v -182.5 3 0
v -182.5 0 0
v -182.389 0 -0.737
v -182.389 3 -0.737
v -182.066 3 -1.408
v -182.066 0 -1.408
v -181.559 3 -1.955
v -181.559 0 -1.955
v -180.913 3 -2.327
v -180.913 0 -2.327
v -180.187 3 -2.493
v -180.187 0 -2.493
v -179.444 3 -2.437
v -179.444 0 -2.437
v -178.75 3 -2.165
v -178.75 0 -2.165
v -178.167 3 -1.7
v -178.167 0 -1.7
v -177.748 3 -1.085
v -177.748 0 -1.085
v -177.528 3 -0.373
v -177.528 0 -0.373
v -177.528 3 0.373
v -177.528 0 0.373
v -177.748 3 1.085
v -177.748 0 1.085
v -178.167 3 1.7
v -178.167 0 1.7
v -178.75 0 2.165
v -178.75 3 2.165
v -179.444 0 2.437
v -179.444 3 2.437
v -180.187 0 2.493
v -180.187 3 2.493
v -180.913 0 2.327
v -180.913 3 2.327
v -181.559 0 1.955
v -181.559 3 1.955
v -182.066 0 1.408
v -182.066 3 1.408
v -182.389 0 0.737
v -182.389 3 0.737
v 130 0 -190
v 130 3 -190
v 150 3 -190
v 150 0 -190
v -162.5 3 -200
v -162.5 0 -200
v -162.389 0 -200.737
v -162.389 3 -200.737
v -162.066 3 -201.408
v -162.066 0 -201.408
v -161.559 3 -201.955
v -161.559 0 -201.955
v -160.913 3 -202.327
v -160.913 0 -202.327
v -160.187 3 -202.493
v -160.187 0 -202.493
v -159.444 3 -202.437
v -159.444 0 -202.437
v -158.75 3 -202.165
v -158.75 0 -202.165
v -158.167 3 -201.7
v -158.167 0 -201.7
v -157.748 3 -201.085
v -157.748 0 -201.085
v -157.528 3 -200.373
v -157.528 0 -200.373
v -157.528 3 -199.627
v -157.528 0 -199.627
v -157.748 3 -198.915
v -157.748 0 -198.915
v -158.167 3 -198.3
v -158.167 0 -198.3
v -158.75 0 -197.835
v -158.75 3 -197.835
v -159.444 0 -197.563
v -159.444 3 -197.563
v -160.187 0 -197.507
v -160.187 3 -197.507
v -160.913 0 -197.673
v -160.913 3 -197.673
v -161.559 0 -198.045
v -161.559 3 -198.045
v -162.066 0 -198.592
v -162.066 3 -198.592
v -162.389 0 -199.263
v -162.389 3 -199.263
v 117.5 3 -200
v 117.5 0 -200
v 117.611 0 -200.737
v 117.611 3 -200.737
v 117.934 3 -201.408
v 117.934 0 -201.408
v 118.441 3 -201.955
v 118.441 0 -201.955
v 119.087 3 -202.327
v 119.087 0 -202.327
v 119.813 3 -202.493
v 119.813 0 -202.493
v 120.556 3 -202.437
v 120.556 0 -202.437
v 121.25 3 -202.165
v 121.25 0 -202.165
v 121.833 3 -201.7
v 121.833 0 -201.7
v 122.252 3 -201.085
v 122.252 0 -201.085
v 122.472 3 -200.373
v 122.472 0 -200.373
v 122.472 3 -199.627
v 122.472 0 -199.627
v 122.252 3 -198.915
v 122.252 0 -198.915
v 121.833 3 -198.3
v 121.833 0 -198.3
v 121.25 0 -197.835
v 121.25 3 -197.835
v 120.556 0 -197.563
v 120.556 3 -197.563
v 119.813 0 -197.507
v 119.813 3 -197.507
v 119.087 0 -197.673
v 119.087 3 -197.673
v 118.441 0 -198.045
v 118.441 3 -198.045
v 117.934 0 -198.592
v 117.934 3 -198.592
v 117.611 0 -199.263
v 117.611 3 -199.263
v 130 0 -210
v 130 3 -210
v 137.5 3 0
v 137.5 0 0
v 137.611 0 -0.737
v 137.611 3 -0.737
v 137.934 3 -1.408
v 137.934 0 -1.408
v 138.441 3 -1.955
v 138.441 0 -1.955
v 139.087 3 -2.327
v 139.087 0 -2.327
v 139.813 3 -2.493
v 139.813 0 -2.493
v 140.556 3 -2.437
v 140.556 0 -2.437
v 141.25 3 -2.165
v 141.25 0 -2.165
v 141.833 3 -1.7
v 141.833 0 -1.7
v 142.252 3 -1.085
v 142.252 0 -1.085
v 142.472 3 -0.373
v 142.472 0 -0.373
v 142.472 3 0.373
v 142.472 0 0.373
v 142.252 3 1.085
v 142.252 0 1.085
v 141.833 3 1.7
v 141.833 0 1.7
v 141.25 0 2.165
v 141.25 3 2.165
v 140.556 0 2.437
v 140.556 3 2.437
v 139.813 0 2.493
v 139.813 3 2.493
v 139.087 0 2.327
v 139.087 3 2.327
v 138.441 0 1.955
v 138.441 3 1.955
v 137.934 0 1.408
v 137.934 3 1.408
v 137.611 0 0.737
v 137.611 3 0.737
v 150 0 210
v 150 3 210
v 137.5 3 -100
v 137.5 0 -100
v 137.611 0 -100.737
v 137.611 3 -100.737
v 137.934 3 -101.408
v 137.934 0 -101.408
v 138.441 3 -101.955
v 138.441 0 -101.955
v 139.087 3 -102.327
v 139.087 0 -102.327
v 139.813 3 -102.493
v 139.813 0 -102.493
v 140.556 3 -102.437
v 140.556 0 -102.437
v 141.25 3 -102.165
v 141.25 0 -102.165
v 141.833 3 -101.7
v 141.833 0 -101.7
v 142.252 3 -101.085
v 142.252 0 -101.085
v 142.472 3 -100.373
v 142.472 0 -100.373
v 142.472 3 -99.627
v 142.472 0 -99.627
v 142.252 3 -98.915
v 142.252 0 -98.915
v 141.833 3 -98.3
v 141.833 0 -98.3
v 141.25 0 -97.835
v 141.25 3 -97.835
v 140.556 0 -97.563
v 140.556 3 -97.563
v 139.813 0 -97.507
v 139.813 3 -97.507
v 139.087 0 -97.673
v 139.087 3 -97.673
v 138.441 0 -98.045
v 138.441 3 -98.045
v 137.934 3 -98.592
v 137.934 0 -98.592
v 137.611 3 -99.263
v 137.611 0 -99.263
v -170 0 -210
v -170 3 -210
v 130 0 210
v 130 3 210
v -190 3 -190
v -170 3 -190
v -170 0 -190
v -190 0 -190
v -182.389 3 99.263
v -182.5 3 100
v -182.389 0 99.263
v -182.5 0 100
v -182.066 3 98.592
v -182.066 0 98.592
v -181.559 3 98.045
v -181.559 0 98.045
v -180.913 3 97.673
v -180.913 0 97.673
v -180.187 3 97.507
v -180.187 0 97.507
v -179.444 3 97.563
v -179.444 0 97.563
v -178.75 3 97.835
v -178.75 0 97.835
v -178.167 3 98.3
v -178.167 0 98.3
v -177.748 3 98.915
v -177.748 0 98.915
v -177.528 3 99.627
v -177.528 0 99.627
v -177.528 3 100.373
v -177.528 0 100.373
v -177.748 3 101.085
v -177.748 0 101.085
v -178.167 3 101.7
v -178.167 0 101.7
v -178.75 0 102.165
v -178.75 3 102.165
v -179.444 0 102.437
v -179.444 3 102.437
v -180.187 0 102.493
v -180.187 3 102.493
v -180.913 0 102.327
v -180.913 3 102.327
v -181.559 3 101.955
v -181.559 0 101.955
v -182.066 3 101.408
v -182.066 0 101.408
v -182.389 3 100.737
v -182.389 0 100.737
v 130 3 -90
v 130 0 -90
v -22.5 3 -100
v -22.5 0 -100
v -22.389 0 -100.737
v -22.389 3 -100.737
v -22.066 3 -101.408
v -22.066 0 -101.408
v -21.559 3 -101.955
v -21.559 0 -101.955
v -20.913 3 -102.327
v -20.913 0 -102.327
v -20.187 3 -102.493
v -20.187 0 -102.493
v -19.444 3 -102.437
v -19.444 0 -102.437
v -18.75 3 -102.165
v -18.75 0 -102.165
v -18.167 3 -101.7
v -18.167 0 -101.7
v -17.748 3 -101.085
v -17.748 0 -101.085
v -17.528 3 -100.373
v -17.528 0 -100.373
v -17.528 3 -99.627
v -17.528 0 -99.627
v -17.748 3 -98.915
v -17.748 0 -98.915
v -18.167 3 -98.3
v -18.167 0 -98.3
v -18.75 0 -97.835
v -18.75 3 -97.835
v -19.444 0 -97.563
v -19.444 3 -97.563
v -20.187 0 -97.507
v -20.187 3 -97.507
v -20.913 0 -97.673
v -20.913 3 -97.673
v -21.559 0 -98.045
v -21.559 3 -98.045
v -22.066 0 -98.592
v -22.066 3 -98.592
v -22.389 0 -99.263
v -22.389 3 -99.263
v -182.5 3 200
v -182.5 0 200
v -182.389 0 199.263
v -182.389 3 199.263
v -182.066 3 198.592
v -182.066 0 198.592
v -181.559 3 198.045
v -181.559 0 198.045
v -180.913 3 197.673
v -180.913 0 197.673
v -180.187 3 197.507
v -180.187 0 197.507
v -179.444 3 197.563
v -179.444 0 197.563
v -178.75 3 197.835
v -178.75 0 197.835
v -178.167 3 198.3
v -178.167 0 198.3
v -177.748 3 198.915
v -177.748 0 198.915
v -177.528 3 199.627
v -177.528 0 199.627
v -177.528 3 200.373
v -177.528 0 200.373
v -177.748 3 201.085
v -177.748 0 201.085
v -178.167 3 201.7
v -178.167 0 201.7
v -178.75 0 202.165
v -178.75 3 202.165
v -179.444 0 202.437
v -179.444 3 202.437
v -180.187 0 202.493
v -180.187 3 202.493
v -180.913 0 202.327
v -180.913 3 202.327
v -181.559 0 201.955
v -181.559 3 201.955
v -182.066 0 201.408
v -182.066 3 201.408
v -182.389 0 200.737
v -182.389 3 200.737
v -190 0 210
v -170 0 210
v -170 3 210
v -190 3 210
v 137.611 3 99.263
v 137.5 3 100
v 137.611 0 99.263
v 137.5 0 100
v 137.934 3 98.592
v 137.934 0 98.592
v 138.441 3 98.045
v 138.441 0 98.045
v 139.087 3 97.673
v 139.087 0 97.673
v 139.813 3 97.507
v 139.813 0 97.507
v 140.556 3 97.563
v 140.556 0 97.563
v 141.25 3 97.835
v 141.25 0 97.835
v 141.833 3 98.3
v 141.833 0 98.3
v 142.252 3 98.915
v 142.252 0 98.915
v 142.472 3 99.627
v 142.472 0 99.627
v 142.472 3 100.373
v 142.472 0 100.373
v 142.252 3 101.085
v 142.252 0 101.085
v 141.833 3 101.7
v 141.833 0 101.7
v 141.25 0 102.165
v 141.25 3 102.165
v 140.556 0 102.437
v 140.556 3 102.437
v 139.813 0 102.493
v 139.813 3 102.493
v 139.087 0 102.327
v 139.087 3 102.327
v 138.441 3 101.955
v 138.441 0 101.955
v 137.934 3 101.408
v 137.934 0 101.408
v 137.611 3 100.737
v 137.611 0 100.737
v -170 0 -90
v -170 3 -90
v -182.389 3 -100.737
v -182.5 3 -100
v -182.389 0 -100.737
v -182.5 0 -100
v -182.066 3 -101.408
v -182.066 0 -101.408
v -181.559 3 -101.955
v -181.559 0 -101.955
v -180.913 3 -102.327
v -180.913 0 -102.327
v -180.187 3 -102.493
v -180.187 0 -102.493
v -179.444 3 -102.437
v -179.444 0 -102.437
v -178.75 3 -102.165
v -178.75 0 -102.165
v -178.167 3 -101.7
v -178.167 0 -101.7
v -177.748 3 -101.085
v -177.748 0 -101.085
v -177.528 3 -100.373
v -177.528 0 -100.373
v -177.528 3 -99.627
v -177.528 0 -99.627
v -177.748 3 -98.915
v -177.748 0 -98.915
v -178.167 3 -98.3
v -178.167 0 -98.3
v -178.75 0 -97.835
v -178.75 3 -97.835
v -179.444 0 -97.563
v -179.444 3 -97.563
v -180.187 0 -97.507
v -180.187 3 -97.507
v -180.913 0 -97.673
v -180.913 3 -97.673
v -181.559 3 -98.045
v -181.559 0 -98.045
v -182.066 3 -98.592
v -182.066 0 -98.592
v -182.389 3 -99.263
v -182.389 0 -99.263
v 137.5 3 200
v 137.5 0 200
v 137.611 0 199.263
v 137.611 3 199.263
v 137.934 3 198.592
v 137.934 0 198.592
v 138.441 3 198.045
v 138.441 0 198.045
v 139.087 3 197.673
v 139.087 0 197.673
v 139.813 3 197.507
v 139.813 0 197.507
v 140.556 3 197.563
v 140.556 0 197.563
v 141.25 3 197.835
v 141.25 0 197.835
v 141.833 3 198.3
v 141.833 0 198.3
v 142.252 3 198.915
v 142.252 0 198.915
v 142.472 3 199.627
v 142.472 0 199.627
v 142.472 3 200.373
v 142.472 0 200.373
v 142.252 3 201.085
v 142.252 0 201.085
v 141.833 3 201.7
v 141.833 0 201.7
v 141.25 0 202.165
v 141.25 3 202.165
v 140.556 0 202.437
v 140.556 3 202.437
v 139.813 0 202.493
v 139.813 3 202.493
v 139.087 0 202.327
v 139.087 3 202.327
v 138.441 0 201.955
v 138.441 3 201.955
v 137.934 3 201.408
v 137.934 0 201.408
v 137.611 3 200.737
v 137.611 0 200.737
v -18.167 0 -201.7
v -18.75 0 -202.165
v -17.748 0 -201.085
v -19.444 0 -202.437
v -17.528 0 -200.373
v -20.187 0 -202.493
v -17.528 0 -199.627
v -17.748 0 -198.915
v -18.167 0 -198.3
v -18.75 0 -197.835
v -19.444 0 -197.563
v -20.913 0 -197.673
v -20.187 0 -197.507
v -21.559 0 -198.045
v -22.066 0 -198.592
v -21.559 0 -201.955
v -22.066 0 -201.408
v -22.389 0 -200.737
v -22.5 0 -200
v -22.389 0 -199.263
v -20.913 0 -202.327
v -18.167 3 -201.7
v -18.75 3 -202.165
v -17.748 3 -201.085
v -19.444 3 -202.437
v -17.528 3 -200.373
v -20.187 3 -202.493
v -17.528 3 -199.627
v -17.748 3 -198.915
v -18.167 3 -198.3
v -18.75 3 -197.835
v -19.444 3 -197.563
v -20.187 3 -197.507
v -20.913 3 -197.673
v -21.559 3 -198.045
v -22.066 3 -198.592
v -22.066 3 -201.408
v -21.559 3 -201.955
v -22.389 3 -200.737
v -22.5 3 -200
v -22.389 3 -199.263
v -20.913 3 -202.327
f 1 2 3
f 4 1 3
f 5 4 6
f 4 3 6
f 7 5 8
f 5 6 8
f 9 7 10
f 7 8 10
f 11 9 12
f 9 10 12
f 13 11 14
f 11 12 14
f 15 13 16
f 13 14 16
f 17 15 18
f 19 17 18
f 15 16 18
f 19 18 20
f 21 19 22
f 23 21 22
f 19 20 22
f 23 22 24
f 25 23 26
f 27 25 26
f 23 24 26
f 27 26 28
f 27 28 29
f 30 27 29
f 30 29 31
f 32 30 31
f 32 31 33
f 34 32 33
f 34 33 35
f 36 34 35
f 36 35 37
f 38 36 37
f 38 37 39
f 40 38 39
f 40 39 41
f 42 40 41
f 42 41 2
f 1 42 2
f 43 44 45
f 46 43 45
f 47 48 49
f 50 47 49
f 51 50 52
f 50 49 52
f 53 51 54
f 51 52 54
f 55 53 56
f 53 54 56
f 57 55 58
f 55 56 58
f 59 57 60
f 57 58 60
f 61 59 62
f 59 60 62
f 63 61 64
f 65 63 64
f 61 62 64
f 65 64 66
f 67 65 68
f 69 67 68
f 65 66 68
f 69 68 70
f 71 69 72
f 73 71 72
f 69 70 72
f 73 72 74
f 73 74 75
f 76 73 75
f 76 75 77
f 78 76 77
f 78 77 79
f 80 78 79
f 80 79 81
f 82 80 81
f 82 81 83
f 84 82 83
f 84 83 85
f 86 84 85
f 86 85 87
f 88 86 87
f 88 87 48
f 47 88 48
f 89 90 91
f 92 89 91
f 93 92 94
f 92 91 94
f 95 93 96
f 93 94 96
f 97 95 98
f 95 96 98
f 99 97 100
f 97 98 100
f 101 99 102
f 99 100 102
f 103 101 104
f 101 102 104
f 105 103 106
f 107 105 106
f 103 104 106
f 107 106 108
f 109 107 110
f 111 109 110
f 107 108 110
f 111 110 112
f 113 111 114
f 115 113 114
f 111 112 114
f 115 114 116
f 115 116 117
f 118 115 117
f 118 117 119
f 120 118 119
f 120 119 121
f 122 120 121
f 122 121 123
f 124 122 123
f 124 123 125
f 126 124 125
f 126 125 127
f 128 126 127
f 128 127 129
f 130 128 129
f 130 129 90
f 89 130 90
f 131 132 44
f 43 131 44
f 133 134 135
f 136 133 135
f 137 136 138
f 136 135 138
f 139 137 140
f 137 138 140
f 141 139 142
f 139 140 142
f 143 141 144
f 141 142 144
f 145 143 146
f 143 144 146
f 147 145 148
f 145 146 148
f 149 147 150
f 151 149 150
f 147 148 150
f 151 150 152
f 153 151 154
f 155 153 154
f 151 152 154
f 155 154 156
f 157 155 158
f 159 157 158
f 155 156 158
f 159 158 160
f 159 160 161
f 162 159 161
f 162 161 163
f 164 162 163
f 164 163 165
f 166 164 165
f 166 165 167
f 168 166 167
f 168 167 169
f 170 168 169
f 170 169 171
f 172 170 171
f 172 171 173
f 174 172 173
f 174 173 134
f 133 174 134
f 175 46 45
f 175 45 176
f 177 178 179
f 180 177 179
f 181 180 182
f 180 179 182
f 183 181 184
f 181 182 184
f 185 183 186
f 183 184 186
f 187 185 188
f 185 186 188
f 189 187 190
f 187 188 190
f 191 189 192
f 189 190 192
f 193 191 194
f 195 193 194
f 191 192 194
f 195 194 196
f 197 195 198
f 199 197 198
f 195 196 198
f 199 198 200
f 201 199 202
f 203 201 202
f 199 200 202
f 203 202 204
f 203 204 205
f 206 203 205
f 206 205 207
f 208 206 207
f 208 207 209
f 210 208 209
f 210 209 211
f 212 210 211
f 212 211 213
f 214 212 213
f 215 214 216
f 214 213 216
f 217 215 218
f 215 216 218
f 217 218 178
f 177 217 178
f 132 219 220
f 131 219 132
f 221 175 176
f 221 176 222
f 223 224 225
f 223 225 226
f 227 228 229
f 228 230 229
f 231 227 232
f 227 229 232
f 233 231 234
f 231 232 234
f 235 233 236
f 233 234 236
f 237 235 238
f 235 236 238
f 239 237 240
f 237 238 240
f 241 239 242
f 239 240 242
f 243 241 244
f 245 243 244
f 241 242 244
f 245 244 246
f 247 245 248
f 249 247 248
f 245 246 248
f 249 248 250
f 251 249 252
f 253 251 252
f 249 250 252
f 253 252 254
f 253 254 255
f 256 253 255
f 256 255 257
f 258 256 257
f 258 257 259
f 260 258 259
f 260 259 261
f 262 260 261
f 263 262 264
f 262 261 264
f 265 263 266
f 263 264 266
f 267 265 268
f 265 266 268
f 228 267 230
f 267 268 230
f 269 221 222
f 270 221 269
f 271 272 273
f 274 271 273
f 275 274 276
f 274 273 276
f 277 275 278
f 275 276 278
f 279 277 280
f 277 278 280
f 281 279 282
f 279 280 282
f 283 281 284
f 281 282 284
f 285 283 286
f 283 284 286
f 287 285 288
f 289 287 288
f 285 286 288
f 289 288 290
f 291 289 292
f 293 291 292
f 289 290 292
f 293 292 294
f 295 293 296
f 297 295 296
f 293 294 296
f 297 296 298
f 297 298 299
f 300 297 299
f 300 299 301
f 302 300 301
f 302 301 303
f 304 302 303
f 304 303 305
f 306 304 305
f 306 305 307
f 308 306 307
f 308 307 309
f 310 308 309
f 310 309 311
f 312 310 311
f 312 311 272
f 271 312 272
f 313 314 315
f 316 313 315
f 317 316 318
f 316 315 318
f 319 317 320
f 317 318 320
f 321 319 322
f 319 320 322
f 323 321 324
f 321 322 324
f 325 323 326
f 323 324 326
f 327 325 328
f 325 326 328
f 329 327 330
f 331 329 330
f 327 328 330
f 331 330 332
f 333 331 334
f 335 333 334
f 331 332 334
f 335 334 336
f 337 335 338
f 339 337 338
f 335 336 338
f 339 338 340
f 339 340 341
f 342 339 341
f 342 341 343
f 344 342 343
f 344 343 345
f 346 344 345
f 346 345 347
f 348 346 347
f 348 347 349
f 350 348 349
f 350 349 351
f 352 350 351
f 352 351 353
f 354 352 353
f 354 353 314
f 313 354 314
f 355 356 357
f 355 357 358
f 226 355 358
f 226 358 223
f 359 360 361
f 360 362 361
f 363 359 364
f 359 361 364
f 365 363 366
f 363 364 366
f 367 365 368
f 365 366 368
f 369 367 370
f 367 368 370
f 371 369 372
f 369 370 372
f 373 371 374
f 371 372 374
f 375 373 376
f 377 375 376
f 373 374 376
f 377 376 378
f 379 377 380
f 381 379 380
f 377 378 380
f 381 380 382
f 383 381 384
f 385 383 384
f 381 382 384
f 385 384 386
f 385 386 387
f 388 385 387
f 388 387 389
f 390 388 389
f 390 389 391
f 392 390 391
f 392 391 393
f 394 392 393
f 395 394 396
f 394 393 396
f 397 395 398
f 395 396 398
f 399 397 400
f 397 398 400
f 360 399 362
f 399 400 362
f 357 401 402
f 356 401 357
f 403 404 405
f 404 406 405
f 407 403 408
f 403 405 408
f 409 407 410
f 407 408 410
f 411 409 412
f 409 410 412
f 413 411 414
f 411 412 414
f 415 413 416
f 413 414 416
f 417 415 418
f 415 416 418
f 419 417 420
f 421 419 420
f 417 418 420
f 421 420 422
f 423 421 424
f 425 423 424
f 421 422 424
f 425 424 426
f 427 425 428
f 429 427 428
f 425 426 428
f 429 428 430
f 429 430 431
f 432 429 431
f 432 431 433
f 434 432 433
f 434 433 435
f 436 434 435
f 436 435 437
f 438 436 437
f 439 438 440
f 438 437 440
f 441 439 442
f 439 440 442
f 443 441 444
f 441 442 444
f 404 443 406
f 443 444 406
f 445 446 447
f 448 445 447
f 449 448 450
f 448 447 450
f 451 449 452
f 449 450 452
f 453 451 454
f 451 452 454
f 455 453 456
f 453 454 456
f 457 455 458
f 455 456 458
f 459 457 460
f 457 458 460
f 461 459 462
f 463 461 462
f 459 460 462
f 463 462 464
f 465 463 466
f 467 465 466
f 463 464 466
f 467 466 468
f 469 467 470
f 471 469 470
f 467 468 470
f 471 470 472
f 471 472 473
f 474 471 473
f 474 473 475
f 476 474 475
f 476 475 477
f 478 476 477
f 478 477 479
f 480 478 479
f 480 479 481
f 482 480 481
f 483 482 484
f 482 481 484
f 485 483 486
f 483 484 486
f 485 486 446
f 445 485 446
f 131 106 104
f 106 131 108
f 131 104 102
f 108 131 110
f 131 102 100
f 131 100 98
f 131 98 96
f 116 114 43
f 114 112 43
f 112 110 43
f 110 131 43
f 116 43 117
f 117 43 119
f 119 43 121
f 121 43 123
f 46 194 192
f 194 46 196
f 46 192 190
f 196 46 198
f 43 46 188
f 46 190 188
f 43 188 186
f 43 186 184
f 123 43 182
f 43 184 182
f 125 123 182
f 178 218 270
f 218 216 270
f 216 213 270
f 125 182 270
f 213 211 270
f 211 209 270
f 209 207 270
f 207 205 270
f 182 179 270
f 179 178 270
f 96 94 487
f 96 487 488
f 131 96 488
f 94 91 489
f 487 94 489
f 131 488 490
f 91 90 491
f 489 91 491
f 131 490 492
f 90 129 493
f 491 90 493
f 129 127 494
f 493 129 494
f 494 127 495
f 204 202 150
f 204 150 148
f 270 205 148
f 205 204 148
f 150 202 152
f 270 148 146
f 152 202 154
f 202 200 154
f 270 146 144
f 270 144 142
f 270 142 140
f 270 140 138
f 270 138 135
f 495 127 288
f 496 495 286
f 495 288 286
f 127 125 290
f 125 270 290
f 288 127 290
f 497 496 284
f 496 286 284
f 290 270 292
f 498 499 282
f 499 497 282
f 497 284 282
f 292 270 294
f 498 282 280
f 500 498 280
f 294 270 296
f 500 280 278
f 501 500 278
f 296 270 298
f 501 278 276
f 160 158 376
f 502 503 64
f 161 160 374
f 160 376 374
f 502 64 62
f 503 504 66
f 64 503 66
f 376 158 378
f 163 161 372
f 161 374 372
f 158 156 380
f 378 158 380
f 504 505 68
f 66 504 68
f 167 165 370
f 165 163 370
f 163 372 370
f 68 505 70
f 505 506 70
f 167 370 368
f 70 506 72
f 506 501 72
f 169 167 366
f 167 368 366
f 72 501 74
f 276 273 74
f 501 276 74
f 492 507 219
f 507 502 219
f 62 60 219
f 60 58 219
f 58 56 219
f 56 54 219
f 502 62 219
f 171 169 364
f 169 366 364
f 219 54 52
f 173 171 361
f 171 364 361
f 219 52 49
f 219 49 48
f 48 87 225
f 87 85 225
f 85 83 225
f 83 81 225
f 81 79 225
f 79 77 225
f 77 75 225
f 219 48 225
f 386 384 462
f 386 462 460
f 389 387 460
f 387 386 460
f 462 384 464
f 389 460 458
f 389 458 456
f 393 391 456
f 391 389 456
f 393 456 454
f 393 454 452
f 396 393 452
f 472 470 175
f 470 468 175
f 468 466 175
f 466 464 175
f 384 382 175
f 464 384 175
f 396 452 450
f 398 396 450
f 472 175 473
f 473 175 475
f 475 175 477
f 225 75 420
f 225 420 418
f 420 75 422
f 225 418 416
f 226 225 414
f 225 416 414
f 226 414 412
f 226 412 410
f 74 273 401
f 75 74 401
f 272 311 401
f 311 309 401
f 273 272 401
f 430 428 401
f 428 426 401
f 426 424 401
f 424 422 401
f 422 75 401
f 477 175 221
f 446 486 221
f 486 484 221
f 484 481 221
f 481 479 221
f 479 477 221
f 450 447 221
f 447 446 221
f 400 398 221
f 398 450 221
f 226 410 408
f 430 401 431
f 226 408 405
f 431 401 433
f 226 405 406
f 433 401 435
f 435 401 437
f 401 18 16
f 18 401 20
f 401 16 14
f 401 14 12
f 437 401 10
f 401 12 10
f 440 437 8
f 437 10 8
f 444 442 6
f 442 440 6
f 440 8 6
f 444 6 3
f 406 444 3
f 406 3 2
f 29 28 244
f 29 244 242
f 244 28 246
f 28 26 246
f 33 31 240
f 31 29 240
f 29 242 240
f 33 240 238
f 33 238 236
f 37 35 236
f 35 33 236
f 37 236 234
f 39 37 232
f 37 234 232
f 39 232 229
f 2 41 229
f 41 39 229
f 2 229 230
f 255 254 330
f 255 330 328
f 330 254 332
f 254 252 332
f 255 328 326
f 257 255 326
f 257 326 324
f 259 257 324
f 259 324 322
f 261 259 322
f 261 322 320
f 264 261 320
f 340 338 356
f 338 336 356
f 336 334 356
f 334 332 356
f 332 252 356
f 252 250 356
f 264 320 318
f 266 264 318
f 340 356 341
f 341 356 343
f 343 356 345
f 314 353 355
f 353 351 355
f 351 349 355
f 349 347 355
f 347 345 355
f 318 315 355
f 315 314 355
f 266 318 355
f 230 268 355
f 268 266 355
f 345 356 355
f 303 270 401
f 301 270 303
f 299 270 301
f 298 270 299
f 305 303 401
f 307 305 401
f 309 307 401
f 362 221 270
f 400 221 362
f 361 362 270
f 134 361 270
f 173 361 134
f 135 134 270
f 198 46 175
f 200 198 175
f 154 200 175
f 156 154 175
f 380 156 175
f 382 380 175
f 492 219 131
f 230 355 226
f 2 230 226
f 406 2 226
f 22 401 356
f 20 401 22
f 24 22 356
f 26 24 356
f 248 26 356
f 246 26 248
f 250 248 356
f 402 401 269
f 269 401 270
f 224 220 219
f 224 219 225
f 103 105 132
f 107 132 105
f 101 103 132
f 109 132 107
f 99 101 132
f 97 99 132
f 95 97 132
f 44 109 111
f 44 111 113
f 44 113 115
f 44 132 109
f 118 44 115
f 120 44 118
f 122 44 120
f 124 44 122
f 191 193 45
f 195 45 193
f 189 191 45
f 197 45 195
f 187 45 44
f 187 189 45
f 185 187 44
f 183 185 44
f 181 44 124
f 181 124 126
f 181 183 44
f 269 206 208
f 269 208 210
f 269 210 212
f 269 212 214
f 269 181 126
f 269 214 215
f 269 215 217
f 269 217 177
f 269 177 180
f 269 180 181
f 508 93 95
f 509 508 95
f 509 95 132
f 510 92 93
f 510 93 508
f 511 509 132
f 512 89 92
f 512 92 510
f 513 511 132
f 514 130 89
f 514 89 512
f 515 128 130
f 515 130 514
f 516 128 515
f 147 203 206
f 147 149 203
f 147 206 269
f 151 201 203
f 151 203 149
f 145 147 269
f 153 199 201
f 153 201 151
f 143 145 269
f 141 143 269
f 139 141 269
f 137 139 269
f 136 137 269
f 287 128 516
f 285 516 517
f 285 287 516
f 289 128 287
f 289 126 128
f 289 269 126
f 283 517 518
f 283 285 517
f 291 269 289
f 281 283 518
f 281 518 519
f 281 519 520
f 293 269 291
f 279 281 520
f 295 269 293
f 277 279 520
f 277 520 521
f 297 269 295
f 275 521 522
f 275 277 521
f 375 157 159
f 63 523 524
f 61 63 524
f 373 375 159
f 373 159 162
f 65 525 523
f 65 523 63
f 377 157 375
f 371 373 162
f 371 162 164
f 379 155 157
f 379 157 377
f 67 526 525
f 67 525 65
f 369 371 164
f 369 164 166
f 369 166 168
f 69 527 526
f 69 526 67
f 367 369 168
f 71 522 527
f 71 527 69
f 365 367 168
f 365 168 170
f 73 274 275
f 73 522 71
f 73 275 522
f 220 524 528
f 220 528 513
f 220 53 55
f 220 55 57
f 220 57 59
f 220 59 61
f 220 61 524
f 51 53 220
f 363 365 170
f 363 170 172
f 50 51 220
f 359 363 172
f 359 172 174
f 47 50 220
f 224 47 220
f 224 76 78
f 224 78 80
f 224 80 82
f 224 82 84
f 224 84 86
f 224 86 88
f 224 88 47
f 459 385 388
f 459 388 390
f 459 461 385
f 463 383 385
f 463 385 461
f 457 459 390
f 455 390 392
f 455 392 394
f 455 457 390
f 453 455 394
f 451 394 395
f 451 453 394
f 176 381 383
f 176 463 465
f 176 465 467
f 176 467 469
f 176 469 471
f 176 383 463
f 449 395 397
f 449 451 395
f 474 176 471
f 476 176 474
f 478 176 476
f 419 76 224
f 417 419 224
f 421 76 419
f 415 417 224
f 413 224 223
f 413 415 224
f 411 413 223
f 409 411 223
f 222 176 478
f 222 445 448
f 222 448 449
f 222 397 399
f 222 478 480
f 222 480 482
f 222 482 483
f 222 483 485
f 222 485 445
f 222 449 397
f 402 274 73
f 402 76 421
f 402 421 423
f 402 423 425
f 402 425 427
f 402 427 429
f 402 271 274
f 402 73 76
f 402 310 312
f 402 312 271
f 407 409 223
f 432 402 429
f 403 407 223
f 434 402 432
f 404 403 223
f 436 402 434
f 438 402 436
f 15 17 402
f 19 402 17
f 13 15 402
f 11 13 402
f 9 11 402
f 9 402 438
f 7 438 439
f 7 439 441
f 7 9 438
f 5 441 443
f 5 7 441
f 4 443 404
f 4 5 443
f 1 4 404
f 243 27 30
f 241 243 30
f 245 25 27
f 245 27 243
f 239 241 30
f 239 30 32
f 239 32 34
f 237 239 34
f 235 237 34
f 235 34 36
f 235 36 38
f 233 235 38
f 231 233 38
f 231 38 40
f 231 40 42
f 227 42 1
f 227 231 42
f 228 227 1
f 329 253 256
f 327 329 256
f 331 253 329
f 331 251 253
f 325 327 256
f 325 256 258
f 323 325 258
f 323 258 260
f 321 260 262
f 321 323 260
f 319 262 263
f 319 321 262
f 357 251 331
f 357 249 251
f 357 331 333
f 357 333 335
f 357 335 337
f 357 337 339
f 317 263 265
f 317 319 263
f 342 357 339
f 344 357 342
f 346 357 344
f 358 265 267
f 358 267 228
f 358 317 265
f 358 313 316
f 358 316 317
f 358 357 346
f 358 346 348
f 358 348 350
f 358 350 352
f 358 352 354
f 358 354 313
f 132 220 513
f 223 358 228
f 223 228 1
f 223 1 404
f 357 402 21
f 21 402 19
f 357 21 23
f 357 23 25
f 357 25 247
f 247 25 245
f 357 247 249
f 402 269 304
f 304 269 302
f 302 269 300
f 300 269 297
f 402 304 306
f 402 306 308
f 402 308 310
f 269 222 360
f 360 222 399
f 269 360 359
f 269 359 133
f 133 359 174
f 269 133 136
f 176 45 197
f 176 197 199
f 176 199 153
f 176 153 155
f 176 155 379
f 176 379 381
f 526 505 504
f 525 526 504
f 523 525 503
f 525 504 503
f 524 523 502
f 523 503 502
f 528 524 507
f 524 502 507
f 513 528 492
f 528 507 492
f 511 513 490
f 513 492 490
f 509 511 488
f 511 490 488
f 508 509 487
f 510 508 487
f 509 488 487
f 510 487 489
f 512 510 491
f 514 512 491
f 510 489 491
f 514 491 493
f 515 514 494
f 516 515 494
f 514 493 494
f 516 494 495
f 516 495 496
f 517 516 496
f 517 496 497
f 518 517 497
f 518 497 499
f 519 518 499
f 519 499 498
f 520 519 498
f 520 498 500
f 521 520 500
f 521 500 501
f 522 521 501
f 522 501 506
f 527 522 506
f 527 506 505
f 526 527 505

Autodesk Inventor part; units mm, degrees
ref_plane "YZ Plane" through (0, 0, 0) normal (1, 0, 0) x (0, 1, 0)
ref_plane "XZ Plane" through (0, 0, 0) normal (0, 1, 0) x (-1, 0, 0)
ref_plane "XY Plane" through (0, 0, 0) normal (0, 0, 1) x (1, 0, 0)
sketch "Sketch1" plane through (0, 0, 0) normal (0, 1, 0) x (-1, 0, 0)
  line L0 (190, 210) -> (190, -210)
  line L1 (190, -210) -> (-150, -210)
  line L2 (-150, -210) -> (-150, 210)
  line L3 (-130, -190) -> (170, -190)
  line L4 (170, -190) -> (170, 190)
  line L5 (-130, 190) -> (-130, -190)
  line L6 (-140, -200) -> (180, -200)
  line L7 (180, -200) -> (180, 200)
  line L8 (-140, 200) -> (-140, -200)
  line L9 (190, -210) -> (190, -90)
  line L10 (190, -90) -> (-150, -90)
  line L11 (170, 190) -> (170, 210)
  line L12 (180, 200) -> (180, 210)
  line L13 (-130, 190) -> (-130, 210)
  line L14 (-140, 200) -> (-140, 210)
  line L15 (-150, 210) -> (-130, 210)
  line L16 (170, 210) -> (190, 210)
  line L17 (190, -90) -> (190, -100)
  line L18 (190, -100) -> (-150, -100)
  line L19 (190, -100) -> (190, -110)
  line L20 (190, -110) -> (-150, -110)
  circle A0 centre (180, 200) radius 2.5
  circle A1 centre (-140, 200) radius 2.5
  circle A2 centre (180, -100) radius 2.5
  circle A3 centre (-140, -100) radius 2.5
  circle A4 centre (20, -100) radius 2.5
  circle A5 centre (180, 100) radius 2.5
  circle A6 centre (180, 0) radius 2.5
  line L21 (0, 0) -> (0, 25.5231)
  circle A7 centre (20, -200) radius 2.5
  circle A8 centre (160, -200) radius 2.5
  line L22 (-140, -200) -> (-120, -200)
  circle A9 centre (-120, -200) radius 2.5
  circle A10 centre (-140, 0) radius 2.5
  circle A11 centre (-140, 100) radius 2.5
  point P0 (170, -90)
  point P1 (-130, -90)
  dimension "d0" = 340
  dimension "d1" = 420
  dimension "d2" = 20
  dimension "d3" = 10
  dimension "d4" = 120
  dimension "d5" = 10
  dimension "d6" = 10
  dimension "d7" = 5
  dimension "d8" = 5
  dimension "d9" = 5
  dimension "d10" = 5
  dimension "d11" = 5
  dimension "d12" = 5
  dimension "d13" = 5
  dimension "d14" = 5
  dimension "d15" = 5
  dimension "d25" = 320
  dimension "d26" = 300
  dimension "d27" = 20
  dimension "d28" = 5
  dimension "d29" = 5
  dimension "d30" = 5
extrude "Extrusion1" add sketch "Sketch1" along normal blind 3 contours L0 L10 L7 A6 A5 A0 L12 L16 | L0 L18 A2 L7 L10 | L12 A0 L7 A5 A6 L10 L4 L11 L16 | L0 L20 L7 A2 L18 | L7 A2 L18 L4 L10 | L0 L1 L2 L20 L8 L6 A9 A7 A8 L7 | L4 L18 A4 L5 L10 | L20 L4 L18 A2 L7 | L7 L6 A8 A7 A9 L8 L20 L5 L3 L4 | L4 L20 L5 L18 A4 | L10 L8 A10 A11 A1 L14 L15 L13 L5 | L5 L18 A3 L8 L10 | L4 L3 L5 L20 | L5 L20 L8 A3 L18 | L10 L2 L15 L14 A1 L8 A11 A10 | L8 A3 L18 L2 L10 | L2 L18 A3 L8 L20 | A10 L8 | L8 A10 | A11 L8 | L8 A11 | A9 L6 | L6 A9
sketch "Sketch2" plane through (0, 3, 0) normal (0, 1, 0) x (1, 0, 0)
  line L0 (130, 90) -> (130, -210) projected
  line L1 (130, -210) -> (150, -210) projected
  line L2 (150, -210) -> (150, 210) projected
  line L3 (150, 210) -> (-190, 210) projected
  line L4 (-190, 210) -> (-190, -210) projected
  line L5 (-190, -210) -> (-170, -210) projected
  line L6 (-170, -210) -> (-170, 90) projected
  line L7 (-170, 90) -> (130, 90) projected
  circle A0 centre (-180, -200) radius 2.5 projected
  circle A1 centre (-180, -100) radius 2.5 projected
  circle A2 centre (-180, 0) radius 2.5 projected
  circle A3 centre (140, 100) radius 2.5 projected
  circle A4 centre (140, -200) radius 2.5 projected
  circle A5 centre (-20, 100) radius 2.5 projected
  circle A6 centre (-20, 200) radius 2.5 projected
  circle A7 centre (-160, 200) radius 2.5 projected
  circle A8 centre (-180, 100) radius 2.5 projected
  line L8 (-190, 210) -> (-170, 210)
  line L9 (-170, 210) -> (-170, 190)
  line L10 (-170, 190) -> (-190, 190)
  line L11 (-190, 190) -> (-190, 210)
  line L12 (150, 210) -> (130, 210)
  line L13 (130, 210) -> (130, 190)
  line L14 (130, 190) -> (150, 190)
  line L15 (150, 190) -> (150, 210)
  point P0 (0, 0)
  point P1 (150, 190)
  dimension "d19" = 20
  dimension "d20" = 20
  dimension "d21" = 20
  dimension "d22" = 20
extrude "Extrusion2" cut sketch "Sketch2" against normal blind 3 contours L14 L13 L3 L2 | L4 L3 L9 L10
extrude "Extrusion3" cut sketch "Sketch1" along normal blind 10 contours A10 L8 | L8 A10 | A11 L8 | L8 A11 | A9 L6 | L6 A9
properties part number "CaraMedia"
